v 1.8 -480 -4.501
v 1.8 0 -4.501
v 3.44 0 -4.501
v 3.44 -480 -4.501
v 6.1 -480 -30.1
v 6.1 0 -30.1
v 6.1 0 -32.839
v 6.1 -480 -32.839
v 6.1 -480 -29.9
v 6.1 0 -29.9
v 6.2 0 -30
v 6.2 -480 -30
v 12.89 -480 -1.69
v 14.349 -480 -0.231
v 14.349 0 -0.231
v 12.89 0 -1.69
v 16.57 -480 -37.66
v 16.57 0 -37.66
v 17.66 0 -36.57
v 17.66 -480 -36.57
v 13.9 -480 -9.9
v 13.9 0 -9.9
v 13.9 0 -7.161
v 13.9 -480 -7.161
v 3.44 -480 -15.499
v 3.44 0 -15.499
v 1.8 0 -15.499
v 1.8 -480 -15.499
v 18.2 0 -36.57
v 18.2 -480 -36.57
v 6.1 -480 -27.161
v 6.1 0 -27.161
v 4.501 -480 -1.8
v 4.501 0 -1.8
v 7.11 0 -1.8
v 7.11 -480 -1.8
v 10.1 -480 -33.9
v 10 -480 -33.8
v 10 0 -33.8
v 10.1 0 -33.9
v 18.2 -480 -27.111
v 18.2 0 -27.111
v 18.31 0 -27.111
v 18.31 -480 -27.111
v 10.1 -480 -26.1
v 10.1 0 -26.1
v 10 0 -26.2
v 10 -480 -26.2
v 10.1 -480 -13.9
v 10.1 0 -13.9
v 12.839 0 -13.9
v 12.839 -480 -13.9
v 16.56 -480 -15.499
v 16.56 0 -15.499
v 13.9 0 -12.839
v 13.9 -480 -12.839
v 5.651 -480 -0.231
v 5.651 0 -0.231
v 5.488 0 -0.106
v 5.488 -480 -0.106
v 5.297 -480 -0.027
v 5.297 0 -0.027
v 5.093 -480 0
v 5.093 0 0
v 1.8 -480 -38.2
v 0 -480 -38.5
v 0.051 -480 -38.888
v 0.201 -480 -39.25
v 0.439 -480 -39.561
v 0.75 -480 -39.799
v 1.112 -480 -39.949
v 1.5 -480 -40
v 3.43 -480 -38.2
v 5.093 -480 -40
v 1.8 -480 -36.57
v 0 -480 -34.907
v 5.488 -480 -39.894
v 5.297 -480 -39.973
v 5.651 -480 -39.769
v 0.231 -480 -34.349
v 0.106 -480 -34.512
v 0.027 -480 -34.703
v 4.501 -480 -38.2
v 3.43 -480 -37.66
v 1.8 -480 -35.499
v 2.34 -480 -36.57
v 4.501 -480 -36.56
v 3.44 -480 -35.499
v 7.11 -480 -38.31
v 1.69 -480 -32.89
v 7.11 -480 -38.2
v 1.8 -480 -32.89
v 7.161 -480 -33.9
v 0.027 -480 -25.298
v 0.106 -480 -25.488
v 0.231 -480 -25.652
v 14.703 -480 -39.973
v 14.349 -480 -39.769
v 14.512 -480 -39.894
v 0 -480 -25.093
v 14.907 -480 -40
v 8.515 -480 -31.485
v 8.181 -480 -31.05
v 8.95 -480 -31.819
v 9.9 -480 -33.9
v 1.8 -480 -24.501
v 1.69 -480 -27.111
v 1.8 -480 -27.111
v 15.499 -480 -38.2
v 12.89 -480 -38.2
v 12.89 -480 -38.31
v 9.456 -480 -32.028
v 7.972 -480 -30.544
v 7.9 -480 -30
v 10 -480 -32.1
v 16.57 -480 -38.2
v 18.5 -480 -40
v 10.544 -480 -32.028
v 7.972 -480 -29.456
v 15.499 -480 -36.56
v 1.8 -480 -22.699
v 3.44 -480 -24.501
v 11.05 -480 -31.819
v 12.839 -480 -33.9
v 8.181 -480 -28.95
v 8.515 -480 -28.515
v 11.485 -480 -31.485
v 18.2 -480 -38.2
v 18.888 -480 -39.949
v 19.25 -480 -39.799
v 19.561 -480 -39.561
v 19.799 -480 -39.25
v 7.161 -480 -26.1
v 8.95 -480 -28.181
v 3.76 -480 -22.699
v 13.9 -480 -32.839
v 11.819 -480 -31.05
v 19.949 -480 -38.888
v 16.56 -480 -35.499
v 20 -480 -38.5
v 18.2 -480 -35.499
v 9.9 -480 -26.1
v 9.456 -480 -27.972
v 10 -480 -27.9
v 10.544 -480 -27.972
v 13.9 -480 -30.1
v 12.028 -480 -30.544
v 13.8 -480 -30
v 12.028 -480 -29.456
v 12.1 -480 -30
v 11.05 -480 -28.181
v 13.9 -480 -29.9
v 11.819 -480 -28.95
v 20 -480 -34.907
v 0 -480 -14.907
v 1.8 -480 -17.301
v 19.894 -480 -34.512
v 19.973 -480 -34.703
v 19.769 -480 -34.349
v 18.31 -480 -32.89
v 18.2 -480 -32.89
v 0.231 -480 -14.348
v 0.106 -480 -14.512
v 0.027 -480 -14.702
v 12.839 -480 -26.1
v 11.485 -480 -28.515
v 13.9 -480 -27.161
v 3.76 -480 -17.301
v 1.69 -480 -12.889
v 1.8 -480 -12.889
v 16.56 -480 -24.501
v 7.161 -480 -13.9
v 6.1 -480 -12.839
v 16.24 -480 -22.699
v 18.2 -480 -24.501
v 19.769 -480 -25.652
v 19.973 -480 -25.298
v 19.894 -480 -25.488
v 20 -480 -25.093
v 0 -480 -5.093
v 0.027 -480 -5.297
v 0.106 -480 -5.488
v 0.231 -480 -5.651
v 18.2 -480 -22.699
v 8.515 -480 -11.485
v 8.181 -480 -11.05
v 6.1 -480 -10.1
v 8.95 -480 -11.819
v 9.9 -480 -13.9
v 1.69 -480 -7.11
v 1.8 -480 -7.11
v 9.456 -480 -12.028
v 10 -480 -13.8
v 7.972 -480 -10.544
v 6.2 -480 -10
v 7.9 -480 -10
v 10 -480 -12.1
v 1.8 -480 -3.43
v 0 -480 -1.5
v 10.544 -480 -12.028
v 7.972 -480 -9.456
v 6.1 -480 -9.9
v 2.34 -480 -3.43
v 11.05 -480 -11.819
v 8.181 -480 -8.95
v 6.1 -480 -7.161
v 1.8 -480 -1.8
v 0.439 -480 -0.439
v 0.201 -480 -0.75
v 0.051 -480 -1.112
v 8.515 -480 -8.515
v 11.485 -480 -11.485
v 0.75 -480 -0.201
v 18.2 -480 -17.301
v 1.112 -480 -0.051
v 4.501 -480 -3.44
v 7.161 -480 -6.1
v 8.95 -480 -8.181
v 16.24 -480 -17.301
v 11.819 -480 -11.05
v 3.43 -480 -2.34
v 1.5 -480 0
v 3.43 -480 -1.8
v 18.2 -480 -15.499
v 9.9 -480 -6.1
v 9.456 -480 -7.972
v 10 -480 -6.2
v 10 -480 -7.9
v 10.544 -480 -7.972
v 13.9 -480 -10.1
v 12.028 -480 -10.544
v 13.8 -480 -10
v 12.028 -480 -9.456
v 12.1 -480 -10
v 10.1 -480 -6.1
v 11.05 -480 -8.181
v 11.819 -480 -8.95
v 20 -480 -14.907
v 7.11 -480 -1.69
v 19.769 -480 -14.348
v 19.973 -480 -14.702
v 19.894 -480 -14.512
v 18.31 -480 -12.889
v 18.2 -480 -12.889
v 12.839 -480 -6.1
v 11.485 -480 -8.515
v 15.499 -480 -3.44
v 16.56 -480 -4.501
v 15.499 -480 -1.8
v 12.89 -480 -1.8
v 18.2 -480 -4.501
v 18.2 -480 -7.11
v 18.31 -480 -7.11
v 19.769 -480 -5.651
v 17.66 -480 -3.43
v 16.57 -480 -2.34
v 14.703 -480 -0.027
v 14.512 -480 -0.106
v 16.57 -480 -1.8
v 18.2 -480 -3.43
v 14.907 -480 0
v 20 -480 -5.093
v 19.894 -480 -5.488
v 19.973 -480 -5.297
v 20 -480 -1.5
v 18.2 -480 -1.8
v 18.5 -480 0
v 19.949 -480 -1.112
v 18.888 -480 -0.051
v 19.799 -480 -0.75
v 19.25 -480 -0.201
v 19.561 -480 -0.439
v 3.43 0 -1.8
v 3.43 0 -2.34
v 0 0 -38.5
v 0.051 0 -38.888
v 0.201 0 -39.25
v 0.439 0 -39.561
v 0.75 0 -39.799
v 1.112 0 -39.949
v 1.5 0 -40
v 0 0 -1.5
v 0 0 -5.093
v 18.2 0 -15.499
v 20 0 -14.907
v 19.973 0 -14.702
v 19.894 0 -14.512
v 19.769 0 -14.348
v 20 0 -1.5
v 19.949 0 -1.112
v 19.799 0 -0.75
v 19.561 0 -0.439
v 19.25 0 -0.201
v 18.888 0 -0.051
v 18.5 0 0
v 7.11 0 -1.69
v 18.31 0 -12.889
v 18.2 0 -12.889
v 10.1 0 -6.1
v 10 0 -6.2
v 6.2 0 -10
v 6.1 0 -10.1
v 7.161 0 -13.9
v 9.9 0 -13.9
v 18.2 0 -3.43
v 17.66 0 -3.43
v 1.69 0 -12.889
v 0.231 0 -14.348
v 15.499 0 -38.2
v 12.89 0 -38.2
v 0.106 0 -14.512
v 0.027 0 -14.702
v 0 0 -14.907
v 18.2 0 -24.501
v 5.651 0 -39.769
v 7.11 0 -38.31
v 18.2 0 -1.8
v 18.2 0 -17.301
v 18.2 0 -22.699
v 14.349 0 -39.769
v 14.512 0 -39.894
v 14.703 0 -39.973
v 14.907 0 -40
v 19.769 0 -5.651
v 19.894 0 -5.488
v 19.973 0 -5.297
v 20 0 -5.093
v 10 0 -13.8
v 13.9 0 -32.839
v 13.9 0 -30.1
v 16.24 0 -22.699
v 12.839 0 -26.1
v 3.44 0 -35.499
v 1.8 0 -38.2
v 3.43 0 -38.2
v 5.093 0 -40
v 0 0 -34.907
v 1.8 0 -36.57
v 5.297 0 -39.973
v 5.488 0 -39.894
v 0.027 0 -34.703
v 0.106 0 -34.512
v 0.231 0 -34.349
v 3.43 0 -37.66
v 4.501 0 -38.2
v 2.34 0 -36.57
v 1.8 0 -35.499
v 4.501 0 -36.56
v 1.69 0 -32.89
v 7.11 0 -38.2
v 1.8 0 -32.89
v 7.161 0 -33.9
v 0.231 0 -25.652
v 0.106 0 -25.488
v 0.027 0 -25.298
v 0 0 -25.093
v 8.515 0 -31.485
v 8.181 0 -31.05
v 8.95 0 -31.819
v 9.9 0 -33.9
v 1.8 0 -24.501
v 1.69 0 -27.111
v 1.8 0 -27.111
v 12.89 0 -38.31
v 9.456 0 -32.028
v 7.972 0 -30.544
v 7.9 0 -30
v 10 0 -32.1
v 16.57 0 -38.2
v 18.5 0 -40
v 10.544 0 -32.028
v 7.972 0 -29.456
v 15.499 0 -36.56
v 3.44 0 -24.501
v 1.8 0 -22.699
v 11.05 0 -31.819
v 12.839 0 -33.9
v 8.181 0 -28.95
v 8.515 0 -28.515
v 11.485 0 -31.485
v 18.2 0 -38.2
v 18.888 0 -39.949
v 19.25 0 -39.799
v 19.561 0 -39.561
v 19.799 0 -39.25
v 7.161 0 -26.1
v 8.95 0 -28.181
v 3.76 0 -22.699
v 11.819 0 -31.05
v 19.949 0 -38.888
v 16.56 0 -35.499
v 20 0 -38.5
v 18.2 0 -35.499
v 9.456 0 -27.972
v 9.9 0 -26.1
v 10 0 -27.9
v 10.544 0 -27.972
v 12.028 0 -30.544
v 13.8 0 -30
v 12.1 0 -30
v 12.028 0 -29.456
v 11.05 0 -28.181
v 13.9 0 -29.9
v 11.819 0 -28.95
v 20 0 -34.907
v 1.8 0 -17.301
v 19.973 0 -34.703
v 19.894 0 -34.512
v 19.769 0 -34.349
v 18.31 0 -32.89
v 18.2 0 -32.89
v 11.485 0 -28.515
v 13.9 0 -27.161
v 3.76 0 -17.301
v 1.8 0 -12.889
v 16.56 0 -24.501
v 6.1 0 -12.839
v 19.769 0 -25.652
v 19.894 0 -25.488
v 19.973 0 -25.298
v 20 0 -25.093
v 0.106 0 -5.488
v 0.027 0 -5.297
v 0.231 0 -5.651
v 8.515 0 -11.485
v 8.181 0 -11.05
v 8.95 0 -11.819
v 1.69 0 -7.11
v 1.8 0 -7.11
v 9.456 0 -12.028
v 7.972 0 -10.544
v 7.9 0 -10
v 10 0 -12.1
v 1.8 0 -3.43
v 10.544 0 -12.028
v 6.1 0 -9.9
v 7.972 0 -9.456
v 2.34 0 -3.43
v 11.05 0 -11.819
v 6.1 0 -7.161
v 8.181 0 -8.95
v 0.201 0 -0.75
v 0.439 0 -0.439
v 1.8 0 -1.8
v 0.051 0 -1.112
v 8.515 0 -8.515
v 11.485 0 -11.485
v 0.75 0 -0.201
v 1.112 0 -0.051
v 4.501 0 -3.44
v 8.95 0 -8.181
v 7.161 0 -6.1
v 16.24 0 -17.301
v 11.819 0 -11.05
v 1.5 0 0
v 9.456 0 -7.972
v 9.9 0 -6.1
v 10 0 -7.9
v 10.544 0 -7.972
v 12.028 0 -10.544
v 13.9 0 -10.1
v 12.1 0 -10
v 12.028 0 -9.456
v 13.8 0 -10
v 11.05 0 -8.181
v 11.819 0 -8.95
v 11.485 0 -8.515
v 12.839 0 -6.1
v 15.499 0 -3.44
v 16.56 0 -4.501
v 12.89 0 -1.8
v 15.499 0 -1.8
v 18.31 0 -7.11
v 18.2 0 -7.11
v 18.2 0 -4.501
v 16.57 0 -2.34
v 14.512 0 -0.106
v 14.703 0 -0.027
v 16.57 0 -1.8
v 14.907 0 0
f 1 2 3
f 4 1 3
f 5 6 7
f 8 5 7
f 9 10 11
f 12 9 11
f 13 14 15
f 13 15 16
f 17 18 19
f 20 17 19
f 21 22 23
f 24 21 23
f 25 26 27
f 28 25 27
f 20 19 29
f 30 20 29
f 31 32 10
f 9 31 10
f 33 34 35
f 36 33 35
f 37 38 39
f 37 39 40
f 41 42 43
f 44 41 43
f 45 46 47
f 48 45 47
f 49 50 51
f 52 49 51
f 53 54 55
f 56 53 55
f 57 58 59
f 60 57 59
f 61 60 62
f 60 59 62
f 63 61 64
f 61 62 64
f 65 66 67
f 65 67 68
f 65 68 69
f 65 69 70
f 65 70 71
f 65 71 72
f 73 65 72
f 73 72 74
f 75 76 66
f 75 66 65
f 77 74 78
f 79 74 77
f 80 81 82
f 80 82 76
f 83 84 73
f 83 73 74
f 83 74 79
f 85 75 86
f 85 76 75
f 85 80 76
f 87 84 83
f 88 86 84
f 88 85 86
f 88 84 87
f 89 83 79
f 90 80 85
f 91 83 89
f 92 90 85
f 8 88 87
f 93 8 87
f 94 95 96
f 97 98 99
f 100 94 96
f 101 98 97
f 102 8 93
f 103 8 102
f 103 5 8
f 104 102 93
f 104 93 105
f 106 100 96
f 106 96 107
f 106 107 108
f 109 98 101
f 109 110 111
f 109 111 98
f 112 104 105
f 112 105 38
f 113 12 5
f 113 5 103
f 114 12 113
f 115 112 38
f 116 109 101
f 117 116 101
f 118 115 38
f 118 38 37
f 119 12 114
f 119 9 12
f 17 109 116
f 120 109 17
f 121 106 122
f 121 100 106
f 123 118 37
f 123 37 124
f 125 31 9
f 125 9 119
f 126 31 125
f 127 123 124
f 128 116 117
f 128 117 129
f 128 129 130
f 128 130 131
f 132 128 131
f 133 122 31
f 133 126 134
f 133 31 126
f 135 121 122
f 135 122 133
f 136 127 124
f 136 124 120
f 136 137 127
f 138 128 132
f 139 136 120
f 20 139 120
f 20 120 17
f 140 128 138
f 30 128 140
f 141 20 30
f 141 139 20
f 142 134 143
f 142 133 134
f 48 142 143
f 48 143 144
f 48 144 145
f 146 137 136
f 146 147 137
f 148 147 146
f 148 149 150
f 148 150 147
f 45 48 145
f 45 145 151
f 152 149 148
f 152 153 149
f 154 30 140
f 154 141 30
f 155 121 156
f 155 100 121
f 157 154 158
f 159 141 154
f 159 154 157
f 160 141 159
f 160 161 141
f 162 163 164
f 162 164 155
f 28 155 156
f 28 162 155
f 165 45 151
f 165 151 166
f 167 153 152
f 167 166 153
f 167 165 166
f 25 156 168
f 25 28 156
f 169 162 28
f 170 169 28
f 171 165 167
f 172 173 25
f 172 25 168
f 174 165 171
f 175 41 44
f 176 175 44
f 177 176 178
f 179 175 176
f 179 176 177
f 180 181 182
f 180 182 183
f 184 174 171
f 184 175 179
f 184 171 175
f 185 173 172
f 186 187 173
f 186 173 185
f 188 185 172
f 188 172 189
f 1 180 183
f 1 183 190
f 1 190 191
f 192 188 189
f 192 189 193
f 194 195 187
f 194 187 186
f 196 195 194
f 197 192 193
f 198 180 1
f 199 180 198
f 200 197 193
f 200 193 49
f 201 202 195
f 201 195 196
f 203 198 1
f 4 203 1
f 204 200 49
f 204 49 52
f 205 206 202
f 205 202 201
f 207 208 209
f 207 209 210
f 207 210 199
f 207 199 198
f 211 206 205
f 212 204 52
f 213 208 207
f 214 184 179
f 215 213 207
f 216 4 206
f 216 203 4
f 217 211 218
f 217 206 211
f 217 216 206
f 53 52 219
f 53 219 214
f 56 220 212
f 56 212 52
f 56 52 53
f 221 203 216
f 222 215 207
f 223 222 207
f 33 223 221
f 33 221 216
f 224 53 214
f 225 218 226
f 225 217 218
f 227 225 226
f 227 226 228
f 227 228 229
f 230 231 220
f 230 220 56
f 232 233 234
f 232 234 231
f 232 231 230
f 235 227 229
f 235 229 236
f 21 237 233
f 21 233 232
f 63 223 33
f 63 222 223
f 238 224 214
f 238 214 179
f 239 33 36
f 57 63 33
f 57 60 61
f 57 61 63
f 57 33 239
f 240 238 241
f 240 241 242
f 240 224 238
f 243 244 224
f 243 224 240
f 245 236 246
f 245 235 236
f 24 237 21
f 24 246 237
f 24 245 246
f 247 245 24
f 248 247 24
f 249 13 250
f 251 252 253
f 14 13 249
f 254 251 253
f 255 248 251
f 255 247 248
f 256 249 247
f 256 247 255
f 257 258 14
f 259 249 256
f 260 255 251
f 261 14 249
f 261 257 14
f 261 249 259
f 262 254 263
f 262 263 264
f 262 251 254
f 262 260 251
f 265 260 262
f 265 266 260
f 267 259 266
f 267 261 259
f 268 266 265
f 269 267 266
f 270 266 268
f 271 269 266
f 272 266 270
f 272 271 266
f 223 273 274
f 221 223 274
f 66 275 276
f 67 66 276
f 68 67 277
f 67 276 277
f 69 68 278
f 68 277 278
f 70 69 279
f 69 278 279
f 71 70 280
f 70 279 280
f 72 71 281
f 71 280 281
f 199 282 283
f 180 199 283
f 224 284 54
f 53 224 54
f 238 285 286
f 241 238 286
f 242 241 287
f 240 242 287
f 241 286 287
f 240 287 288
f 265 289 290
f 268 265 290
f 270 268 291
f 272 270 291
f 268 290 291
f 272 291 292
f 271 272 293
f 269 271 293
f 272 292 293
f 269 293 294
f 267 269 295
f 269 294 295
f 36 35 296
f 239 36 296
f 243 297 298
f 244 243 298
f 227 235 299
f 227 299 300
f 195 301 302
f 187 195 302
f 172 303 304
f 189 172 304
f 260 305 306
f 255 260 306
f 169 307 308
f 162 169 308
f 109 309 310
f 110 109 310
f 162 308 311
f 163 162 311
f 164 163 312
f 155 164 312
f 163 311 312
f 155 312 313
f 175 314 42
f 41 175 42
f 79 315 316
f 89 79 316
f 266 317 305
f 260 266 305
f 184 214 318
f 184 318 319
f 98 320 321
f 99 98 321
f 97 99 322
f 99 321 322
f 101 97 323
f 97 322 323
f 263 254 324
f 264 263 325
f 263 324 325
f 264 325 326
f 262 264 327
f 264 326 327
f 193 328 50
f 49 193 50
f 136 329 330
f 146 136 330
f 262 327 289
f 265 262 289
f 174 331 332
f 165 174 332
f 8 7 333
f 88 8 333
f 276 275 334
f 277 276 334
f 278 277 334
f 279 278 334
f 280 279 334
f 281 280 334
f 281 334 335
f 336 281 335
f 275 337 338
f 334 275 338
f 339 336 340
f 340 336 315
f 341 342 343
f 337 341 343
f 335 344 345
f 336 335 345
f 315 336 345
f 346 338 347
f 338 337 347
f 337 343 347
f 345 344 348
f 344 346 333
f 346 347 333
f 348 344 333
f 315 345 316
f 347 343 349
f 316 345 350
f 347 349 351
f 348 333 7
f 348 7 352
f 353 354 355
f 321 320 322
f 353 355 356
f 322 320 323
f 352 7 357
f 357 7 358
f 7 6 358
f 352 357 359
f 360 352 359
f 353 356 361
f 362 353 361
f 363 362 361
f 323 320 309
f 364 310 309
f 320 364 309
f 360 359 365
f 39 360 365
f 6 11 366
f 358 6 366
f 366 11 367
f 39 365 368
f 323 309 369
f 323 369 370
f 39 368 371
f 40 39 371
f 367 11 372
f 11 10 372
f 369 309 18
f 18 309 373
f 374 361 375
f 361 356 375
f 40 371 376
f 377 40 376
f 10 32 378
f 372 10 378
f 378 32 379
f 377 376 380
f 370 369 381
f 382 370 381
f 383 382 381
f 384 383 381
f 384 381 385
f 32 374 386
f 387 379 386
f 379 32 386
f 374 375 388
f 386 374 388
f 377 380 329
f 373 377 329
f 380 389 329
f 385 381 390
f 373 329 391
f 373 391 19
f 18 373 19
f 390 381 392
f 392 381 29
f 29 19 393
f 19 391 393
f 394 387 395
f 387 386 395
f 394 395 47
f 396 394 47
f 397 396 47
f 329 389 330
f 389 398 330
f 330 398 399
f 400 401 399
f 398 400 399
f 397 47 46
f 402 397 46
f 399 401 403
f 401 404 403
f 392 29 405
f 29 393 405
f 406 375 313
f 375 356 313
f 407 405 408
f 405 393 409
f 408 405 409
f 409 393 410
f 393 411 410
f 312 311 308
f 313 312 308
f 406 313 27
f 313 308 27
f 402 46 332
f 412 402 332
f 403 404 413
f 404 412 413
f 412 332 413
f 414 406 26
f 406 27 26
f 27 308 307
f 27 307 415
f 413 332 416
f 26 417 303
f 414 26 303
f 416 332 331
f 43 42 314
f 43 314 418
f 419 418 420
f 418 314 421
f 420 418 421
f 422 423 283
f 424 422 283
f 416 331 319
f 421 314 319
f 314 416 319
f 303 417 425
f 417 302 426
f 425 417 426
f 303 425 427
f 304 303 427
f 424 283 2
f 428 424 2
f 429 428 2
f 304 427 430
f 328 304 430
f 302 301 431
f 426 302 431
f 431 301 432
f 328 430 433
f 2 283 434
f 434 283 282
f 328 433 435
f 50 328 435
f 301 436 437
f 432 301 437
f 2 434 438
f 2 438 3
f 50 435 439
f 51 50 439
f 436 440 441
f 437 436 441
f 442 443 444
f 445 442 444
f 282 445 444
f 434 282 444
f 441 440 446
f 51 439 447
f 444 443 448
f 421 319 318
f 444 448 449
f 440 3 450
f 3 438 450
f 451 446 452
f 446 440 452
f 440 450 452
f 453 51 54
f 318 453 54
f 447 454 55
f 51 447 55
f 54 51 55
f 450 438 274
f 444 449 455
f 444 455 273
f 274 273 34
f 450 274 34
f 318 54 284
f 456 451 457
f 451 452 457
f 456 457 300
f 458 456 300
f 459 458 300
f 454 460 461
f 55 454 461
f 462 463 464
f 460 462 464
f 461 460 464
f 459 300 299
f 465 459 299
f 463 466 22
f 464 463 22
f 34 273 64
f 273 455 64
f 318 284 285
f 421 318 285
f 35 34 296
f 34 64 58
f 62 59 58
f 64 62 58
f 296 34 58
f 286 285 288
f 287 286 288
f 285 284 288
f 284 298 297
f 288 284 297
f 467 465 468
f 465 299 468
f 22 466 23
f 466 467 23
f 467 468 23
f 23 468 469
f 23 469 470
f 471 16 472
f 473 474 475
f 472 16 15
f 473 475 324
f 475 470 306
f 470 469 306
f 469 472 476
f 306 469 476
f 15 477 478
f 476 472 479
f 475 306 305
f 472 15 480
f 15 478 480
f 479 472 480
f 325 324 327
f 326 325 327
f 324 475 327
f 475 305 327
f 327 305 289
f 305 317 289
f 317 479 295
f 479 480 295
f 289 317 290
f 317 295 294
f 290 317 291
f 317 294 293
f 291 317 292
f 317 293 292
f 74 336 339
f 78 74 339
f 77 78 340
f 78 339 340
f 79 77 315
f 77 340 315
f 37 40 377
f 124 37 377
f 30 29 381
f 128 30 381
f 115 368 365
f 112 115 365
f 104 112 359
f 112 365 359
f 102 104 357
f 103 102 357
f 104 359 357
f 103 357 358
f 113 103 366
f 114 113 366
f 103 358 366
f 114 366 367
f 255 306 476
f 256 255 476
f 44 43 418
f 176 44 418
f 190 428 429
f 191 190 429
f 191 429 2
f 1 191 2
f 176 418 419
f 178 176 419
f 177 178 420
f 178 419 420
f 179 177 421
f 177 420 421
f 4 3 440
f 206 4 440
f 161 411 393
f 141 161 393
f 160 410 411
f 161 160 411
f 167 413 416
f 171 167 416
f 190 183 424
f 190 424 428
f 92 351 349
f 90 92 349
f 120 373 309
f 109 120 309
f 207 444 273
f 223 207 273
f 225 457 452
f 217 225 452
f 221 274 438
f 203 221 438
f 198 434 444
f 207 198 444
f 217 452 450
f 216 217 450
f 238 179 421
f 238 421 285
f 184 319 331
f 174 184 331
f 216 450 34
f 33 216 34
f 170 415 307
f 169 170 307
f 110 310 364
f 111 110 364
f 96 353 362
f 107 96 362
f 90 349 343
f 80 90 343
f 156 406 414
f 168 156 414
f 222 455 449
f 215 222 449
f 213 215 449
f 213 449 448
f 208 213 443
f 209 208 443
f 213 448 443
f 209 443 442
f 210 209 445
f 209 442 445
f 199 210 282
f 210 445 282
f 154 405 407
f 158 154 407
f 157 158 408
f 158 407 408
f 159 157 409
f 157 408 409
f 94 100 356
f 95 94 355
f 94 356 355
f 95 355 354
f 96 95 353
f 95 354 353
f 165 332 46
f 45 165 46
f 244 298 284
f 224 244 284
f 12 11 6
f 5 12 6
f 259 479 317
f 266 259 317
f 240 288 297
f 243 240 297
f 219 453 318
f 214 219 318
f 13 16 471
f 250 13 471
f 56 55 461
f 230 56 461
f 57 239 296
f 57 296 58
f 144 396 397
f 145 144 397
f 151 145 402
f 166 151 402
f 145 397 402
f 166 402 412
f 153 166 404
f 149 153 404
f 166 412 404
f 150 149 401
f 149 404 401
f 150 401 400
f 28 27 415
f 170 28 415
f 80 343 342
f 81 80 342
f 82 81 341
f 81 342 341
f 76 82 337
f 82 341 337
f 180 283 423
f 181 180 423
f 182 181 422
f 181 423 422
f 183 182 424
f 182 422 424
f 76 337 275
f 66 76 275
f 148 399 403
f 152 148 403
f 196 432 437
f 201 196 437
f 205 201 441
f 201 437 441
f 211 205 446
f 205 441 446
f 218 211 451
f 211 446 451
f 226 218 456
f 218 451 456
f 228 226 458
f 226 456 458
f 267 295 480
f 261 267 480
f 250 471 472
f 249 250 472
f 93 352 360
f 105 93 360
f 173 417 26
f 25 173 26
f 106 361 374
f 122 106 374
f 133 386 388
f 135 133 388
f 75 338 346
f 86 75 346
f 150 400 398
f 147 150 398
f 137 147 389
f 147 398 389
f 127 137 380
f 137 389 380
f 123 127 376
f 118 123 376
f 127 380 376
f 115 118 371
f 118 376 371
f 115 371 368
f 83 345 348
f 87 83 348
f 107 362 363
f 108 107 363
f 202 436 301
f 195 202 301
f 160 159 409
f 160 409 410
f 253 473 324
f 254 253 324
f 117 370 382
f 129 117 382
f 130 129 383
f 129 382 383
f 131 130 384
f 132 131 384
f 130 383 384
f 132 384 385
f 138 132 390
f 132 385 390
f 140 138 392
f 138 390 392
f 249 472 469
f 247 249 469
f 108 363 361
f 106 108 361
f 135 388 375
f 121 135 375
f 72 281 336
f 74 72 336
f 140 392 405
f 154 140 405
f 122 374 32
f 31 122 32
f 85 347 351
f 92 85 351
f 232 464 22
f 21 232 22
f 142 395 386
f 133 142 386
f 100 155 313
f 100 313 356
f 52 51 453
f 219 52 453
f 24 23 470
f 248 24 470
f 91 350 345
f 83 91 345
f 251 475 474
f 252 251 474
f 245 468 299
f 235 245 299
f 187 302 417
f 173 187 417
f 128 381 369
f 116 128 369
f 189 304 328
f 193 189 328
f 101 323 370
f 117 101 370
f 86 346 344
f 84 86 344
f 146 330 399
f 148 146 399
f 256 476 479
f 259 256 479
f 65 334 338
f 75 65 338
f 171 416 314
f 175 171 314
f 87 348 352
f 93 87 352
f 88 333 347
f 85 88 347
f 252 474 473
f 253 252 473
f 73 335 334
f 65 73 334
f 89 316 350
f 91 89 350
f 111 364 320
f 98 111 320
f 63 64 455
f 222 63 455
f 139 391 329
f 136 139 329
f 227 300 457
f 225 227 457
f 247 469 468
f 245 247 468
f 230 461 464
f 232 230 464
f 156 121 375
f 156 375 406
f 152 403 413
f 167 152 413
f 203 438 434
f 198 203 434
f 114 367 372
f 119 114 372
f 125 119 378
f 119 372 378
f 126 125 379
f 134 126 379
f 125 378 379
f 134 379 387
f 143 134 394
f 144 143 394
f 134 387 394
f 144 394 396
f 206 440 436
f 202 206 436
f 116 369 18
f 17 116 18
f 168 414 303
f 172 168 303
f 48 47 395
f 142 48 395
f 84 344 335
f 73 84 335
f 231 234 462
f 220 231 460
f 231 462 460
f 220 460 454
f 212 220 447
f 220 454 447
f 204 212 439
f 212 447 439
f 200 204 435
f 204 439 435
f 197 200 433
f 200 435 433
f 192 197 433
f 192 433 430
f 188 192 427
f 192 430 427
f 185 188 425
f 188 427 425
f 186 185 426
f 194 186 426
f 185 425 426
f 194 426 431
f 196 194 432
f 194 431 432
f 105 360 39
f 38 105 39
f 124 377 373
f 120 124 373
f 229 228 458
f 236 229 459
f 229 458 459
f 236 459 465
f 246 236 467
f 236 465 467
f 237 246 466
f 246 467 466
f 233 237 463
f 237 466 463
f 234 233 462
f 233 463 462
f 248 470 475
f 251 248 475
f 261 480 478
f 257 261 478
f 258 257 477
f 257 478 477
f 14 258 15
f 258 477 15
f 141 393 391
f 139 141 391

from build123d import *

# Parameters (mm, degrees)
F2_DEPTH = 480


with BuildPart() as f2:
    # F0 (on Front) → F2 (new body)
    with BuildSketch(Plane.XZ):
        with BuildLine():
            Line((5.0927712857, 0), (1.5, 0))
            ThreePointArc((1.5, 0), (0.4393398282, -0.4393398282), (0, -1.5))
            Line((0, -1.5), (0, -5.0927712857))
            ThreePointArc((0, -5.0927712857), (0.0601351693, -5.3950911973), (0.2313856429, -5.6513856429))
            Line((0.2313856429, -5.6513856429), (1.69, -7.11))
            Line((1.69, -7.11), (1.8, -7.11))
            Line((1.8, -7.11), (1.8, -4.5006601718))
            Line((1.8, -4.5006601718), (3.44, -4.5006601718))
            Line((3.44, -4.5006601718), (6.1000000155, -7.1606601718))
            Line((6.1000000155, -7.1606601718), (6.1000000155, -9.9))
            Line((6.1000000155, -9.9), (6.2000000155, -10))
            Line((6.2000000155, -10), (6.1000000155, -10.1))
            Line((6.1000000155, -10.1), (6.1000000155, -12.8393398605))
            Line((6.1000000155, -12.8393398605), (3.44, -15.4993398916))
            Line((3.44, -15.4993398916), (1.8, -15.4993398916))
            Line((1.8, -15.4993398916), (1.8, -12.8893398916))
            Line((1.8, -12.8893398916), (1.69, -12.8893398916))
            Line((1.69, -12.8893398916), (0.2313856429, -14.3479542487))
            ThreePointArc((0.2313856429, -14.3479542487), (0.0601351693, -14.6042486943), (0, -14.9065686059))
            Line((0, -14.9065686059), (0, -20))
            Line((0, -20), (0, -25.0934313941))
            ThreePointArc((0, -25.0934313941), (0.0601351693, -25.3957513057), (0.2313856429, -25.6520457513))
            Line((0.2313856429, -25.6520457513), (1.69, -27.1106601084))
            Line((1.69, -27.1106601084), (1.8, -27.1106601084))
            Line((1.8, -27.1106601084), (1.8, -24.5006601084))
            Line((1.8, -24.5006601084), (3.44, -24.5006601084))
            Line((3.44, -24.5006601084), (6.1000000155, -27.1606601395))
            Line((6.1000000155, -27.1606601395), (6.1000000155, -29.9))
            Line((6.1000000155, -29.9), (6.2000000155, -30))
            Line((6.2000000155, -30), (6.1000000155, -30.1))
            Line((6.1000000155, -30.1), (6.1000000155, -32.8393398282))
            Line((6.1000000155, -32.8393398282), (3.44, -35.4993398282))
            Line((3.44, -35.4993398282), (1.8, -35.4993398282))
            Line((1.8, -35.4993398282), (1.8, -32.89))
            Line((1.8, -32.89), (1.69, -32.89))
            Line((1.69, -32.89), (0.2313856429, -34.3486143571))
            ThreePointArc((0.2313856429, -34.3486143571), (0.0601351693, -34.6049088027), (0, -34.9072287143))
            Line((0, -34.9072287143), (0, -38.5))
            ThreePointArc((0, -38.5), (0.4393398282, -39.5606601718), (1.5, -40))
            Line((1.5, -40), (5.0927712857, -40))
            ThreePointArc((5.0927712857, -40), (5.3950911973, -39.9398648307), (5.6513856429, -39.7686143571))
            Line((5.6513856429, -39.7686143571), (7.11, -38.31))
            Line((7.11, -38.31), (7.11, -38.2))
            Line((7.11, -38.2), (4.5006601718, -38.2))
            Line((4.5006601718, -38.2), (4.5006601718, -36.56))
            Line((4.5006601718, -36.56), (7.1606601873, -33.9))
            Line((7.1606601873, -33.9), (9.9000000155, -33.9))
            Line((9.9000000155, -33.9), (10.0000000478, -33.8000000323))
            Line((10.0000000478, -33.8000000323), (10.1000000802, -33.9))
            Line((10.1000000802, -33.9), (12.8393399084, -33.9))
            Line((12.8393399084, -33.9), (15.4993399239, -36.56))
            Line((15.4993399239, -36.56), (15.4993399239, -38.2))
            Line((15.4993399239, -38.2), (12.8900000957, -38.2))
            Line((12.8900000957, -38.2), (12.8900000957, -38.31))
            Line((12.8900000957, -38.31), (14.3486144528, -39.7686143571))
            ThreePointArc((14.3486144528, -39.7686143571), (14.6049088984, -39.9398648307), (14.90722881, -40))
            Line((14.90722881, -40), (18.5000000957, -40))
            ThreePointArc((18.5000000957, -40), (19.5606602675, -39.5606601718), (20.0000000957, -38.5))
            Line((20.0000000957, -38.5), (20.0000000957, -34.9072287143))
            ThreePointArc((20.0000000957, -34.9072287143), (19.9398649264, -34.6049088027), (19.7686144528, -34.3486143571))
            Line((19.7686144528, -34.3486143571), (18.3100000957, -32.89))
            Line((18.3100000957, -32.89), (18.2000000957, -32.89))
            Line((18.2000000957, -32.89), (18.2000000957, -35.4993398282))
            Line((18.2000000957, -35.4993398282), (16.5600000957, -35.4993398282))
            Line((16.5600000957, -35.4993398282), (13.9000000802, -32.8393398282))
            Line((13.9000000802, -32.8393398282), (13.9000000802, -30.1))
            Line((13.9000000802, -30.1), (13.8000000802, -30))
            Line((13.8000000802, -30), (13.9000000802, -29.9))
            Line((13.9000000802, -29.9), (13.9000000802, -27.1606601395))
            Line((13.9000000802, -27.1606601395), (16.5600000957, -24.5006601084))
            Line((16.5600000957, -24.5006601084), (18.2000000957, -24.5006601084))
            Line((18.2000000957, -24.5006601084), (18.2000000957, -27.1106601084))
            Line((18.2000000957, -27.1106601084), (18.3100000957, -27.1106601084))
            Line((18.3100000957, -27.1106601084), (19.7686144528, -25.6520457513))
            ThreePointArc((19.7686144528, -25.6520457513), (19.9398649264, -25.3957513057), (20.0000000957, -25.0934313941))
            Line((20.0000000957, -25.0934313941), (20.0000000957, -20))
            Line((20.0000000957, -20), (20.0000000957, -14.9065686059))
            ThreePointArc((20.0000000957, -14.9065686059), (19.9398649264, -14.6042486943), (19.7686144528, -14.3479542487))
            Line((19.7686144528, -14.3479542487), (18.3100000957, -12.8893398916))
            Line((18.3100000957, -12.8893398916), (18.2000000957, -12.8893398916))
            Line((18.2000000957, -12.8893398916), (18.2000000957, -15.4993398916))
            Line((18.2000000957, -15.4993398916), (16.5600000957, -15.4993398916))
            Line((16.5600000957, -15.4993398916), (13.9000000802, -12.8393398605))
            Line((13.9000000802, -12.8393398605), (13.9000000802, -10.1))
            Line((13.9000000802, -10.1), (13.8000000802, -10))
            Line((13.8000000802, -10), (13.9000000802, -9.9))
            Line((13.9000000802, -9.9), (13.9000000802, -7.1606601718))
            Line((13.9000000802, -7.1606601718), (16.5600000957, -4.5006601718))
            Line((16.5600000957, -4.5006601718), (18.2000000957, -4.5006601718))
            Line((18.2000000957, -4.5006601718), (18.2000000957, -7.11))
            Line((18.2000000957, -7.11), (18.3100000957, -7.11))
            Line((18.3100000957, -7.11), (19.7686144528, -5.6513856429))
            ThreePointArc((19.7686144528, -5.6513856429), (19.9398649264, -5.3950911973), (20.0000000957, -5.0927712857))
            Line((20.0000000957, -5.0927712857), (20.0000000957, -1.5))
            ThreePointArc((20.0000000957, -1.5), (19.5606602675, -0.4393398282), (18.5000000957, 0))
            Line((18.5000000957, 0), (14.90722881, 0))
            ThreePointArc((14.90722881, 0), (14.6049088984, -0.0601351693), (14.3486144528, -0.2313856429))
            Line((14.3486144528, -0.2313856429), (12.8900000957, -1.69))
            Line((12.8900000957, -1.69), (12.8900000957, -1.8))
            Line((12.8900000957, -1.8), (15.4993399239, -1.8))
            Line((15.4993399239, -1.8), (15.4993399239, -3.44))
            Line((15.4993399239, -3.44), (12.8393399084, -6.1))
            Line((12.8393399084, -6.1), (10.1000000802, -6.1))
            Line((10.1000000802, -6.1), (10.0000000478, -6.1999999677))
            Line((10.0000000478, -6.1999999677), (9.9000000155, -6.1))
            Line((9.9000000155, -6.1), (7.1606601873, -6.1))
            Line((7.1606601873, -6.1), (4.5006601718, -3.44))
            Line((4.5006601718, -3.44), (4.5006601718, -1.8))
            Line((4.5006601718, -1.8), (7.11, -1.8))
            Line((7.11, -1.8), (7.11, -1.69))
            Line((7.11, -1.69), (5.6513856429, -0.2313856429))
            ThreePointArc((5.6513856429, -0.2313856429), (5.3950911973, -0.0601351693), (5.0927712857, 0))
        make_face()
        Polygon((1.8, -38.2), (1.8, -36.57), (2.34, -36.57), (3.43, -37.66), (3.43, -38.2), align=None, mode=Mode.SUBTRACT)
        with BuildLine():
            ThreePointArc((10.0000000478, -27.9), (11.4849242883, -28.5150757595), (12.1000000478, -30))
            ThreePointArc((12.1000000478, -30), (11.4849242883, -31.4849242405), (10.0000000478, -32.1))
            ThreePointArc((10.0000000478, -32.1), (8.5150758074, -31.4849242405), (7.9000000478, -30))
            ThreePointArc((7.9000000478, -30), (8.5150758074, -28.5150757595), (10.0000000478, -27.9))
        make_face(mode=Mode.SUBTRACT)
        Polygon((17.6600000957, -36.57), (18.2000000957, -36.57), (18.2000000957, -38.2), (16.5700000957, -38.2), (16.5700000957, -37.66), align=None, mode=Mode.SUBTRACT)
        Polygon((9.9000000478, -13.9000000323), (10.0000000478, -13.8000000323), (10.1000000478, -13.9000000323), (12.8393399084, -13.9000000323), (16.2400000478, -17.3006601916), (18.2000000478, -17.3006601916), (18.2000000478, -20), (18.2000000478, -22.6993398084), (16.2400000478, -22.6993398084), (12.8393399084, -26.0999999677), (10.1000000478, -26.0999999677), (10.0000000478, -26.1999999677), (9.9000000478, -26.0999999677), (7.1606601873, -26.0999999677), (3.7600000478, -22.6993398084), (1.8000000478, -22.6993398084), (1.8000000478, -20), (1.8000000478, -17.3006601916), (3.7600000478, -17.3006601916), (7.1606601873, -13.9000000323), align=None, mode=Mode.SUBTRACT)
        Polygon((1.8, -3.43), (1.8, -1.8), (3.43, -1.8), (3.43, -2.34), (2.34, -3.43), align=None, mode=Mode.SUBTRACT)
        with BuildLine():
            ThreePointArc((7.9000000478, -10), (8.5150758074, -8.5150757595), (10.0000000478, -7.9))
            ThreePointArc((10.0000000478, -7.9), (11.4849242883, -8.5150757595), (12.1000000478, -10))
            ThreePointArc((12.1000000478, -10), (11.4849242883, -11.4849242405), (10.0000000478, -12.1))
            ThreePointArc((10.0000000478, -12.1), (8.5150758074, -11.4849242405), (7.9000000478, -10))
        make_face(mode=Mode.SUBTRACT)
        Polygon((16.5700000957, -2.34), (16.5700000957, -1.8), (18.2000000957, -1.8), (18.2000000957, -3.43), (17.6600000957, -3.43), align=None, mode=Mode.SUBTRACT)
    extrude(amount=F2_DEPTH)


solid = f2.part
